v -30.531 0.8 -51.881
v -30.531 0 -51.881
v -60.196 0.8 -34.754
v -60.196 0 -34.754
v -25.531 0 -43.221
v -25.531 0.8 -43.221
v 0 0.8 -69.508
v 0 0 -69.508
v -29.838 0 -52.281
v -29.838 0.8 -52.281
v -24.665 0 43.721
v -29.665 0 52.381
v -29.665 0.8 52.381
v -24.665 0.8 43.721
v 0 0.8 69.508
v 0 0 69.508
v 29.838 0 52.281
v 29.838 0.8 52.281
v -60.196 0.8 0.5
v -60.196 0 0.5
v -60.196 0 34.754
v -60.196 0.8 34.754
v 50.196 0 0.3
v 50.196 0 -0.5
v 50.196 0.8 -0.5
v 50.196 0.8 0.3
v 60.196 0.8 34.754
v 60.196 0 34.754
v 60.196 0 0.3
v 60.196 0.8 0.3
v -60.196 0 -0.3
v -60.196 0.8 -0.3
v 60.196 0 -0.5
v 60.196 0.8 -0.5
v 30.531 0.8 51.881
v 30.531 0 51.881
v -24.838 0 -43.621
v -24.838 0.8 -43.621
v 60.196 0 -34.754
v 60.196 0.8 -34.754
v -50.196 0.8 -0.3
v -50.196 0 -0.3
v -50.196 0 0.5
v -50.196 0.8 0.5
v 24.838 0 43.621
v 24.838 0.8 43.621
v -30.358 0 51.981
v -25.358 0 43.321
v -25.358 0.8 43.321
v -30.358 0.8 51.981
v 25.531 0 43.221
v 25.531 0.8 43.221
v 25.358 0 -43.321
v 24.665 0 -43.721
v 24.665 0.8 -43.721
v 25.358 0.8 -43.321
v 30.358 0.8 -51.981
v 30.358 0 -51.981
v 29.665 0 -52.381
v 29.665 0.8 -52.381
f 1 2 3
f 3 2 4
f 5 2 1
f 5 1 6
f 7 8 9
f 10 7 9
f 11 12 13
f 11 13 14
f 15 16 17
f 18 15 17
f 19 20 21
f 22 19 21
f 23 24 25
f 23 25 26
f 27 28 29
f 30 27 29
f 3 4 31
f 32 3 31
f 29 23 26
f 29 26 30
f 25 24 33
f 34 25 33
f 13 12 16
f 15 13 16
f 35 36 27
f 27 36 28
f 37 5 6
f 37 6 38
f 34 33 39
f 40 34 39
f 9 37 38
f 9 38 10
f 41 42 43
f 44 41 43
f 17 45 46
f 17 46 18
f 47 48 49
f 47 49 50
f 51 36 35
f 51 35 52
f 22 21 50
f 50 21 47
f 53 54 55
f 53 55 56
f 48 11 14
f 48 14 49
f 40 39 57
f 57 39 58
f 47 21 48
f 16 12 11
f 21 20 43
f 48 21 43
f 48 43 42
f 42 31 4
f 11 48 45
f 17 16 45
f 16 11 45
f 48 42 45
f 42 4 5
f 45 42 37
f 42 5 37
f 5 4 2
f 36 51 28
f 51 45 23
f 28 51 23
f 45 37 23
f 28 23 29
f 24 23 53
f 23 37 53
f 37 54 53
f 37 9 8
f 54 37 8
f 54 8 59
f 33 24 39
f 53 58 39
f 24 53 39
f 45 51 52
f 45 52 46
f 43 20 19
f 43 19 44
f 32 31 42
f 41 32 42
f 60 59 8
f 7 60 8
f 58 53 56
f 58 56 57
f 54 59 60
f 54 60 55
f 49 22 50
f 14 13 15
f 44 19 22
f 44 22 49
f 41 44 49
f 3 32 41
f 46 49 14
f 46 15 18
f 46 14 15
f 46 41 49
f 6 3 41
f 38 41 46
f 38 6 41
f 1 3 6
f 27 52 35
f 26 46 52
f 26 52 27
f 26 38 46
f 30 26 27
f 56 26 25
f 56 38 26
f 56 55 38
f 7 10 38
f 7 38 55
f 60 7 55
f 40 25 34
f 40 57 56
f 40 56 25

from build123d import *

# Parameters (mm, degrees)
BOSS_EXTRUDE1_DEPTH = 0.8
SKETCH3_W           = 10
SKETCH3_H           = 0.8
CUT_EXTRUDE1_DEPTH  = 1.8


with BuildPart() as part:
    # Sketch2 → Boss-Extrude1 (new body)
    with BuildSketch(Plane(origin=(0, 0, 0), x_dir=(1, 0, 0), z_dir=(0, 1, 0))):
        Polygon((0, 69.507859614), (-60.195572189, 34.753929807), (-60.195572189, -34.753929807), (0, -69.507859614), (60.195572189, -34.753929807), (60.195572189, 34.753929807), align=None)
    extrude(amount=BOSS_EXTRUDE1_DEPTH)

    # Sketch3 → Cut-Extrude1 (cut, through all)
    with BuildSketch(Plane.XZ):
        Polygon((29.664773392, -52.380894711), (24.664773392, -43.720640673), (25.357593716, -43.320640673), (30.357593716, -51.980894711), align=None)
        with Locations((55.195572189, -0.1)):
            Rectangle(SKETCH3_W, SKETCH3_H)
        Polygon((-30.530798796, -51.880894711), (-25.530798796, -43.220640673), (-24.837978473, -43.620640673), (-29.837978473, -52.280894711), align=None)
        with Locations((-55.195572189, 0.1)):
            Rectangle(SKETCH3_W, SKETCH3_H)
        Polygon((-29.664773392, 52.380894711), (-24.664773392, 43.720640673), (-25.357593716, 43.320640673), (-30.357593716, 51.980894711), align=None)
        Polygon((30.530798796, 51.880894711), (25.530798796, 43.220640673), (24.837978473, 43.620640673), (29.837978473, 52.280894711), align=None)
    extrude(amount=-CUT_EXTRUDE1_DEPTH, mode=Mode.SUBTRACT)


solid = part.part
